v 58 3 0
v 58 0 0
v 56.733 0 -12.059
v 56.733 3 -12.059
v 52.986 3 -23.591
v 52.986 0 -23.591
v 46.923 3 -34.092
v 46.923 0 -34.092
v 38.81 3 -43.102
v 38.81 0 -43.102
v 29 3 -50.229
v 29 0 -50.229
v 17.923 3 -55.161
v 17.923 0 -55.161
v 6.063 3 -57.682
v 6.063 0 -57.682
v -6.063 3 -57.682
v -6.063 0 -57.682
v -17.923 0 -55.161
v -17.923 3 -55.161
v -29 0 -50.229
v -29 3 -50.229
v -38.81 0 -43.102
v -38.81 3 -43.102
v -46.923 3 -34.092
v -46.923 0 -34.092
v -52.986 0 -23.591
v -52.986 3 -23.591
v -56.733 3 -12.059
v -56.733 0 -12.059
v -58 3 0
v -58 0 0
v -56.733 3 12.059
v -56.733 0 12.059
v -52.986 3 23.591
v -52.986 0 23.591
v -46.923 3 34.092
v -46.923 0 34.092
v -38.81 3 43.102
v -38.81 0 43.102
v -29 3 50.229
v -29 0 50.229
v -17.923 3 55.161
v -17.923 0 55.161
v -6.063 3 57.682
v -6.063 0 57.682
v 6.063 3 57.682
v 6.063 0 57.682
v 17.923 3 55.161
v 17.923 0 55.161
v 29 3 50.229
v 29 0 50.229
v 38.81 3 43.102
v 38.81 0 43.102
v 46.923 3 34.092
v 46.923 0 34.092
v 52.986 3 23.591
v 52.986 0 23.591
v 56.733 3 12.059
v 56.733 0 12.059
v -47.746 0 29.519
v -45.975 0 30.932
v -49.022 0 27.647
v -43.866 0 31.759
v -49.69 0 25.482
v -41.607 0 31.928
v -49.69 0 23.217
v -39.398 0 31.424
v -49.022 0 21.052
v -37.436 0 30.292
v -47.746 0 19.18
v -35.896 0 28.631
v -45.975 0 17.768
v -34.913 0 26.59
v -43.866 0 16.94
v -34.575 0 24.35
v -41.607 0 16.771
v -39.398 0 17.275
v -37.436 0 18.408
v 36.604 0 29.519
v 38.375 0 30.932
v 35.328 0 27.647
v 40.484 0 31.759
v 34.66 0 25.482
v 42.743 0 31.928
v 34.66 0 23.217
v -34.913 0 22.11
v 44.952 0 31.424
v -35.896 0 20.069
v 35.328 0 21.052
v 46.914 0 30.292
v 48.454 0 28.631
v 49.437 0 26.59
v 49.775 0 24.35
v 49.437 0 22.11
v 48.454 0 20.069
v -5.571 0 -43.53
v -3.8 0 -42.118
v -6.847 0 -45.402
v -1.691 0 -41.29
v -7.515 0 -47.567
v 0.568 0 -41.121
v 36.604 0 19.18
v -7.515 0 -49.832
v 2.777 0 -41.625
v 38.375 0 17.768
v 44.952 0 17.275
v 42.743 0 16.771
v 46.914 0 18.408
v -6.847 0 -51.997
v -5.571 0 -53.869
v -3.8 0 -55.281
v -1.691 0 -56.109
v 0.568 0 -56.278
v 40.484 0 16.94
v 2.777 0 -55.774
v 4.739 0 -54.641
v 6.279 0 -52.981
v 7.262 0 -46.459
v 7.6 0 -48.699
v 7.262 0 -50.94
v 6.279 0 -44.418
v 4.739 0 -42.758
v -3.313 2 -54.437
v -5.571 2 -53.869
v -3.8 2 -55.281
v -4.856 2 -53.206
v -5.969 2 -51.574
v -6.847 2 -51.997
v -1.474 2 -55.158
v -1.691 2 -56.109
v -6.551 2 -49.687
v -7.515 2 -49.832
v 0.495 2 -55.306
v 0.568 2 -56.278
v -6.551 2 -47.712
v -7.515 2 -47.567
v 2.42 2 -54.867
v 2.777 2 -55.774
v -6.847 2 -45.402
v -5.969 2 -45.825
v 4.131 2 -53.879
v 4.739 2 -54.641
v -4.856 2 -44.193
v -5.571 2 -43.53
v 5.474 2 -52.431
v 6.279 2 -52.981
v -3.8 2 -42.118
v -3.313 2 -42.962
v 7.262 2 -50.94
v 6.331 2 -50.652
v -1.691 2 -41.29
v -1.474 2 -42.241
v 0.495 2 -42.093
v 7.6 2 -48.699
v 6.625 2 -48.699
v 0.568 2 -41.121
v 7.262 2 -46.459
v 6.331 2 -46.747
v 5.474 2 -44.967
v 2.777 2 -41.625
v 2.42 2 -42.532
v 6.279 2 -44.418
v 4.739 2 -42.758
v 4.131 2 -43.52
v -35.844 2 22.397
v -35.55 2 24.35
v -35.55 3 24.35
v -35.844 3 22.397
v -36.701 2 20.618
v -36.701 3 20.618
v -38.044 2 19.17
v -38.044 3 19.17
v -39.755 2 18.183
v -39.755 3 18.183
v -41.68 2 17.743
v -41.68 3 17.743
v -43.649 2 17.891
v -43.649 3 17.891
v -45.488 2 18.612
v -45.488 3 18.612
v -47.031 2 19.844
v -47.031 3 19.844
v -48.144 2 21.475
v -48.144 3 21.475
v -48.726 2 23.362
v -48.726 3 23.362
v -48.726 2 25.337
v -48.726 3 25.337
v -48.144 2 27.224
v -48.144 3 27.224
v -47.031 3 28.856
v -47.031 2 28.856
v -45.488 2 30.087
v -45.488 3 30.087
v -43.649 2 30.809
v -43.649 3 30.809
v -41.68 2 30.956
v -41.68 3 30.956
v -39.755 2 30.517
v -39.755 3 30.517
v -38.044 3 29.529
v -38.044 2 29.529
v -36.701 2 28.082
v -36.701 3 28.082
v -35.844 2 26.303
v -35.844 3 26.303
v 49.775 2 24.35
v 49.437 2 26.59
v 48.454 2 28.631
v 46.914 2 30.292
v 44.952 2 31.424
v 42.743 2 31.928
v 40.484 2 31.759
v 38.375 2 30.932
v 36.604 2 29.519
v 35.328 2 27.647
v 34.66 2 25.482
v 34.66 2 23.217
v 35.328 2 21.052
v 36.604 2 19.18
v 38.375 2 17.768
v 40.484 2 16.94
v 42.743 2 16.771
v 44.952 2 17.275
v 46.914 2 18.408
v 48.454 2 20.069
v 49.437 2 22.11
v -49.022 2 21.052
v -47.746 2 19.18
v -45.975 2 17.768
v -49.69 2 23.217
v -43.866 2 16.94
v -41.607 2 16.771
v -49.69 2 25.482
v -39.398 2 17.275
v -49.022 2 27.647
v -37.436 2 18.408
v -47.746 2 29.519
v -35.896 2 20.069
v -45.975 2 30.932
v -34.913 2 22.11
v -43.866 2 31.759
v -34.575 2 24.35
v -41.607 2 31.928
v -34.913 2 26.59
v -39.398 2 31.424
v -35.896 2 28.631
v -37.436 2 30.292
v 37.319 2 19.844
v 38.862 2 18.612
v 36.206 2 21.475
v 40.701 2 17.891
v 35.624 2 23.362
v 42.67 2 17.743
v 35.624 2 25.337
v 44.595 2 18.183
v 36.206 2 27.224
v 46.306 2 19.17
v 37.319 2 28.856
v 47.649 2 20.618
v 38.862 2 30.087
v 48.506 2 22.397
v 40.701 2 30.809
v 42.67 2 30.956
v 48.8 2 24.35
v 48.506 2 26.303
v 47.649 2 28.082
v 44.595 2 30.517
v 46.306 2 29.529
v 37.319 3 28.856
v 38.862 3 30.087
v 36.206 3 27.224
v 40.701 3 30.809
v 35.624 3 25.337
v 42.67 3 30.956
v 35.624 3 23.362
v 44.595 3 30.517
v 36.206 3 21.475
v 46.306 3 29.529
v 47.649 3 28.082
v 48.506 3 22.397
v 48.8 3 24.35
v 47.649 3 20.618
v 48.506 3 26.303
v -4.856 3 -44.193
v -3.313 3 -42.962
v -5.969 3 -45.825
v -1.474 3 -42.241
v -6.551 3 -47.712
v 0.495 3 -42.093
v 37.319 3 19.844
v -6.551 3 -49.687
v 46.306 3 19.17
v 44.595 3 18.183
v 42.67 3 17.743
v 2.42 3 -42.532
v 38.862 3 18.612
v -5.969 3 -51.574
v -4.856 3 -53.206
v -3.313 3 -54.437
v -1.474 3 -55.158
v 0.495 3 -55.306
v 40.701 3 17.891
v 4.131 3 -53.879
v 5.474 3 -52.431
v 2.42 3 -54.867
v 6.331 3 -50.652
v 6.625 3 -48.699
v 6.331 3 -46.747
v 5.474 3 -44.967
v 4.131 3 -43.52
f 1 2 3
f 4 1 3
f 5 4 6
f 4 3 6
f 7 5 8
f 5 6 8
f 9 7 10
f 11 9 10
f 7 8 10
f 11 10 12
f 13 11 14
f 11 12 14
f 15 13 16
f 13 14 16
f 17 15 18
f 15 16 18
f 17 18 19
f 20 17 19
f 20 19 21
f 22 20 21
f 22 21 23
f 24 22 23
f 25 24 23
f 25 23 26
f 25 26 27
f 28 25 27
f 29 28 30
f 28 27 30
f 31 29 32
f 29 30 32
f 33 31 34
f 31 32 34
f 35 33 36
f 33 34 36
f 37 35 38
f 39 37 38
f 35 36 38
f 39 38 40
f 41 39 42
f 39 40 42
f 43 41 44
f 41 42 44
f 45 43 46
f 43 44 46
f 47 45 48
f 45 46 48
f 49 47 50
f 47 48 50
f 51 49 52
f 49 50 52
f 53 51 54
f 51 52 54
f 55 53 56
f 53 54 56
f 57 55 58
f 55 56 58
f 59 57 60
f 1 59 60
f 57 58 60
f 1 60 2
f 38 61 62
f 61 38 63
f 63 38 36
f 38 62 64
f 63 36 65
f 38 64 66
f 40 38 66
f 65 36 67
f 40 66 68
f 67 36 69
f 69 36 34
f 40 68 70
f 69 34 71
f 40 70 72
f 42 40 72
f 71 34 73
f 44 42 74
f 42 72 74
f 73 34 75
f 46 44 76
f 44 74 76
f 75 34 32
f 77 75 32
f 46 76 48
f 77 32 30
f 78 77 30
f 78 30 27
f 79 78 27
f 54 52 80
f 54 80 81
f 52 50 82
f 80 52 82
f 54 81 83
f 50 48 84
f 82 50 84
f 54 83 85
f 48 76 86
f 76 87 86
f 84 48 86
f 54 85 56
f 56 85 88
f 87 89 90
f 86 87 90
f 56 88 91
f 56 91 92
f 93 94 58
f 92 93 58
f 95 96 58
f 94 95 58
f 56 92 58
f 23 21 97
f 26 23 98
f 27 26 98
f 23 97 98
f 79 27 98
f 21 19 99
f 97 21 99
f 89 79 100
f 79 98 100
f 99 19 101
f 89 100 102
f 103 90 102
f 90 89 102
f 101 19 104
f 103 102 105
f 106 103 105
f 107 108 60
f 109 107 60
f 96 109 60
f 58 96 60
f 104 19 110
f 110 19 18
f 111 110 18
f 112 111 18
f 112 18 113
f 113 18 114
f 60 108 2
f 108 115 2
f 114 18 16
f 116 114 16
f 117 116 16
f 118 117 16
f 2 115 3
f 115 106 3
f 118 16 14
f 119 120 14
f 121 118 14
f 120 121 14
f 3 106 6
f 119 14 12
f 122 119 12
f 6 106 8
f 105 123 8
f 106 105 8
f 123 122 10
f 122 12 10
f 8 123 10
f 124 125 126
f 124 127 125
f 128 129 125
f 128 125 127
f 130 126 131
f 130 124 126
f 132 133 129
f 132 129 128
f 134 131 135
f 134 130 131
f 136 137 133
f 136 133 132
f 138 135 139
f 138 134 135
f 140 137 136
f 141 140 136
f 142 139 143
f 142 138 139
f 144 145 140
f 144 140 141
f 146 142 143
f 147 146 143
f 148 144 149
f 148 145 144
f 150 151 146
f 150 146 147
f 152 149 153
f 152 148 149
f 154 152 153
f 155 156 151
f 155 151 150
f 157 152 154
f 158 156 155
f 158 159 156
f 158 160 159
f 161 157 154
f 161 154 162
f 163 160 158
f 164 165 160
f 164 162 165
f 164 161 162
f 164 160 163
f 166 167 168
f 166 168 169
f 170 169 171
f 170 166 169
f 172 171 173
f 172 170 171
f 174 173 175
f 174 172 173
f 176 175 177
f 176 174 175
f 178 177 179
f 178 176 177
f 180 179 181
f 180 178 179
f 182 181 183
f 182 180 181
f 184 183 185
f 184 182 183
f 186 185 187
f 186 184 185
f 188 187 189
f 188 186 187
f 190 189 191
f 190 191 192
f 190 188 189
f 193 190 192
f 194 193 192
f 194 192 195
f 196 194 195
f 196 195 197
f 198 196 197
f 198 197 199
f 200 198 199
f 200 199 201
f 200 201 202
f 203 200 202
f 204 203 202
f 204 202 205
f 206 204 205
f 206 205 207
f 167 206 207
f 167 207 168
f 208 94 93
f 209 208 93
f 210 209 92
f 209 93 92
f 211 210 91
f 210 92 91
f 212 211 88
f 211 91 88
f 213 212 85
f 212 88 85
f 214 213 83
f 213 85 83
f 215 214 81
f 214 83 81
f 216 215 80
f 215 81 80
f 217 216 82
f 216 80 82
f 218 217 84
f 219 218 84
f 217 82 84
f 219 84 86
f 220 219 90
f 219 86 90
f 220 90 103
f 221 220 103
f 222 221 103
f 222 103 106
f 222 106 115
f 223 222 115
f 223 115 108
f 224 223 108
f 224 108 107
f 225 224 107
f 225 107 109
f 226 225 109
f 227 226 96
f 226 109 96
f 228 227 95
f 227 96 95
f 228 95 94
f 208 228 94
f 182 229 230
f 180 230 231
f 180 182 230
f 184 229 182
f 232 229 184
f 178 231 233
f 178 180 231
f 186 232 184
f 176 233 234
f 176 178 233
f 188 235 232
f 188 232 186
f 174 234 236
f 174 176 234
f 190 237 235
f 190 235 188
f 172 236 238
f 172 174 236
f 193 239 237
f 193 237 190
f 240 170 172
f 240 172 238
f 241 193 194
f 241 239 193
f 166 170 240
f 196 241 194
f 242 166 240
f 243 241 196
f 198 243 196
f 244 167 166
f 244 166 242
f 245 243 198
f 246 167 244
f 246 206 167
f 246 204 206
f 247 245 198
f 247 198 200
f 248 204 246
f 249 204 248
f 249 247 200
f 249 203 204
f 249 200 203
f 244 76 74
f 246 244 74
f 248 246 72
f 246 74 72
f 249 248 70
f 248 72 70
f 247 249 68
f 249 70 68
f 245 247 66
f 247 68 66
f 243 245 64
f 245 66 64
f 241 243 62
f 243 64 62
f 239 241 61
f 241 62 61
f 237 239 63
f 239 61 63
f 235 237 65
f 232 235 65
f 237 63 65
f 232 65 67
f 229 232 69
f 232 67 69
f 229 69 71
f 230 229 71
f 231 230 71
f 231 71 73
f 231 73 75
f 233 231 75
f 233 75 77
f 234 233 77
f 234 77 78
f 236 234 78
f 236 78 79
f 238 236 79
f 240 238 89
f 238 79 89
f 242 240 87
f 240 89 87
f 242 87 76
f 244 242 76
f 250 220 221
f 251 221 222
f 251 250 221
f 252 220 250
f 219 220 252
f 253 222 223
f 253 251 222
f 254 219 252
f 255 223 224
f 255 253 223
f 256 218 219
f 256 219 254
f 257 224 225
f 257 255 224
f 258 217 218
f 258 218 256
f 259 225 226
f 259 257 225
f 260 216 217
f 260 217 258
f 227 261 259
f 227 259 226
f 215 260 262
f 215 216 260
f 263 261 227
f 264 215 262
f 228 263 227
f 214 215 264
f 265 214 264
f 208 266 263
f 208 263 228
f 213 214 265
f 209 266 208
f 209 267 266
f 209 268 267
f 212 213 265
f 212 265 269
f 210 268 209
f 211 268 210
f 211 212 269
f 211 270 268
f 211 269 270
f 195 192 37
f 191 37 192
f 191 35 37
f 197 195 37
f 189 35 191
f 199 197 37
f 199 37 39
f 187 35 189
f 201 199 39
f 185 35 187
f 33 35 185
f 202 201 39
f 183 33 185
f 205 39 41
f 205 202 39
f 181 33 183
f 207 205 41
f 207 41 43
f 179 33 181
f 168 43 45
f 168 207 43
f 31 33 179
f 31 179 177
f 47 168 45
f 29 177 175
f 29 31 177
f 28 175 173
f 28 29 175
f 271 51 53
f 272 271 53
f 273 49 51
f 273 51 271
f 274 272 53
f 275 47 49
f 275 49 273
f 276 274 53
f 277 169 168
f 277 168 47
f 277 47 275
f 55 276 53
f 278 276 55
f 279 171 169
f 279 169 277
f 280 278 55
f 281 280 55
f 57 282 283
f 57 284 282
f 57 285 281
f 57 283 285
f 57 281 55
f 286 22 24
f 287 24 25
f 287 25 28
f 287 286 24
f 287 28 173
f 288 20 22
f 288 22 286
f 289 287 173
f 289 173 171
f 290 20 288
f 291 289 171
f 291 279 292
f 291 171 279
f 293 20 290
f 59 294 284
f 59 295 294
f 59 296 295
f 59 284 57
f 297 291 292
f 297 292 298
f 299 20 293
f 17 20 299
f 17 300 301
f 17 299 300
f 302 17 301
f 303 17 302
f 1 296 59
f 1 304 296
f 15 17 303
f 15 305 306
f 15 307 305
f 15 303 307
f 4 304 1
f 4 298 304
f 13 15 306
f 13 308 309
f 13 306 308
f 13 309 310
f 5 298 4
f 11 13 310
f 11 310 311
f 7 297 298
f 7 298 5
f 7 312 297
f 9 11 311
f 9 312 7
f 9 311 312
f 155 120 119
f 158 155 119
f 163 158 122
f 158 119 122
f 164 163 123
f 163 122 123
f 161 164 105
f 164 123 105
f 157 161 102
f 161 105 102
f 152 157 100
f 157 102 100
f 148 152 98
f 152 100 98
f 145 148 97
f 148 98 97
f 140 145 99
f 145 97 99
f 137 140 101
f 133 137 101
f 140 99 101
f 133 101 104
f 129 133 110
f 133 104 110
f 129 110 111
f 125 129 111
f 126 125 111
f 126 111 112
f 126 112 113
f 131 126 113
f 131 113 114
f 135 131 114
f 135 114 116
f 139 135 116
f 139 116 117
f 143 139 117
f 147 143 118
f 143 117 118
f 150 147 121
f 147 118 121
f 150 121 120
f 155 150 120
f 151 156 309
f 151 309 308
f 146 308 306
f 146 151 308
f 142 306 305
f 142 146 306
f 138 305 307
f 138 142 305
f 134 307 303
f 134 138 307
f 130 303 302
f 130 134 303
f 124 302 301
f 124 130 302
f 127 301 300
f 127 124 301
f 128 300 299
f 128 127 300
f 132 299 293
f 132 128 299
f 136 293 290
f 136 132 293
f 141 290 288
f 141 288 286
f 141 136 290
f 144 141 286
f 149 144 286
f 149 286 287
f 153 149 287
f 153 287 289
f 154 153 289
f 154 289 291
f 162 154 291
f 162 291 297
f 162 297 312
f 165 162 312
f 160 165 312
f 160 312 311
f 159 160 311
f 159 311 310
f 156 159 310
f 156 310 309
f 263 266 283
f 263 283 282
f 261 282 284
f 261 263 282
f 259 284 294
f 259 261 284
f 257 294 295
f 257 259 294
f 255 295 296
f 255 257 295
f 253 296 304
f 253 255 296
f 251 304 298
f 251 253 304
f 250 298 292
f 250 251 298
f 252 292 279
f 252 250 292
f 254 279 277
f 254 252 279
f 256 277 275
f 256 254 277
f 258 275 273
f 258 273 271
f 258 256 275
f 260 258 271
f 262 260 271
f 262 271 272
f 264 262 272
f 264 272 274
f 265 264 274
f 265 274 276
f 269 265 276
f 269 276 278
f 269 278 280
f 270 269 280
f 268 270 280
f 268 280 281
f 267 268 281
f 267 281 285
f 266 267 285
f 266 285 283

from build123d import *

# Parameters (mm, degrees)
SKETCH1_R           = 58
SKETCH1_R_2         = 6.625
BOSS_EXTRUDE1_DEPTH = 3
SKETCH2_R           = 7.6
CUT_EXTRUDE1_DEPTH  = 2


with BuildPart() as part:
    # Sketch1 → Boss-Extrude1 (new body)
    with BuildSketch(Plane(origin=(0, 0, 0), x_dir=(1, 0, 0), z_dir=(0, 1, 0))):
        Circle(SKETCH1_R)
        with Locations((0, 48.699495206)):
            Circle(SKETCH1_R_2, mode=Mode.SUBTRACT)
        with Locations((42.175, -24.349747603)):
            Circle(SKETCH1_R_2, mode=Mode.SUBTRACT)
        with Locations((-42.175, -24.349747603)):
            Circle(SKETCH1_R_2, mode=Mode.SUBTRACT)
    extrude(amount=BOSS_EXTRUDE1_DEPTH)

    # Sketch2 → Cut-Extrude1 (cut)
    with BuildSketch(Plane.XZ):
        with Locations((42.175, 24.349747603)):
            Circle(SKETCH2_R)
        with Locations((-42.175, 24.349747603)):
            Circle(SKETCH2_R)
        with Locations((0, -48.699495206)):
            Circle(SKETCH2_R)
    extrude(amount=-CUT_EXTRUDE1_DEPTH, mode=Mode.SUBTRACT)


solid = part.part
